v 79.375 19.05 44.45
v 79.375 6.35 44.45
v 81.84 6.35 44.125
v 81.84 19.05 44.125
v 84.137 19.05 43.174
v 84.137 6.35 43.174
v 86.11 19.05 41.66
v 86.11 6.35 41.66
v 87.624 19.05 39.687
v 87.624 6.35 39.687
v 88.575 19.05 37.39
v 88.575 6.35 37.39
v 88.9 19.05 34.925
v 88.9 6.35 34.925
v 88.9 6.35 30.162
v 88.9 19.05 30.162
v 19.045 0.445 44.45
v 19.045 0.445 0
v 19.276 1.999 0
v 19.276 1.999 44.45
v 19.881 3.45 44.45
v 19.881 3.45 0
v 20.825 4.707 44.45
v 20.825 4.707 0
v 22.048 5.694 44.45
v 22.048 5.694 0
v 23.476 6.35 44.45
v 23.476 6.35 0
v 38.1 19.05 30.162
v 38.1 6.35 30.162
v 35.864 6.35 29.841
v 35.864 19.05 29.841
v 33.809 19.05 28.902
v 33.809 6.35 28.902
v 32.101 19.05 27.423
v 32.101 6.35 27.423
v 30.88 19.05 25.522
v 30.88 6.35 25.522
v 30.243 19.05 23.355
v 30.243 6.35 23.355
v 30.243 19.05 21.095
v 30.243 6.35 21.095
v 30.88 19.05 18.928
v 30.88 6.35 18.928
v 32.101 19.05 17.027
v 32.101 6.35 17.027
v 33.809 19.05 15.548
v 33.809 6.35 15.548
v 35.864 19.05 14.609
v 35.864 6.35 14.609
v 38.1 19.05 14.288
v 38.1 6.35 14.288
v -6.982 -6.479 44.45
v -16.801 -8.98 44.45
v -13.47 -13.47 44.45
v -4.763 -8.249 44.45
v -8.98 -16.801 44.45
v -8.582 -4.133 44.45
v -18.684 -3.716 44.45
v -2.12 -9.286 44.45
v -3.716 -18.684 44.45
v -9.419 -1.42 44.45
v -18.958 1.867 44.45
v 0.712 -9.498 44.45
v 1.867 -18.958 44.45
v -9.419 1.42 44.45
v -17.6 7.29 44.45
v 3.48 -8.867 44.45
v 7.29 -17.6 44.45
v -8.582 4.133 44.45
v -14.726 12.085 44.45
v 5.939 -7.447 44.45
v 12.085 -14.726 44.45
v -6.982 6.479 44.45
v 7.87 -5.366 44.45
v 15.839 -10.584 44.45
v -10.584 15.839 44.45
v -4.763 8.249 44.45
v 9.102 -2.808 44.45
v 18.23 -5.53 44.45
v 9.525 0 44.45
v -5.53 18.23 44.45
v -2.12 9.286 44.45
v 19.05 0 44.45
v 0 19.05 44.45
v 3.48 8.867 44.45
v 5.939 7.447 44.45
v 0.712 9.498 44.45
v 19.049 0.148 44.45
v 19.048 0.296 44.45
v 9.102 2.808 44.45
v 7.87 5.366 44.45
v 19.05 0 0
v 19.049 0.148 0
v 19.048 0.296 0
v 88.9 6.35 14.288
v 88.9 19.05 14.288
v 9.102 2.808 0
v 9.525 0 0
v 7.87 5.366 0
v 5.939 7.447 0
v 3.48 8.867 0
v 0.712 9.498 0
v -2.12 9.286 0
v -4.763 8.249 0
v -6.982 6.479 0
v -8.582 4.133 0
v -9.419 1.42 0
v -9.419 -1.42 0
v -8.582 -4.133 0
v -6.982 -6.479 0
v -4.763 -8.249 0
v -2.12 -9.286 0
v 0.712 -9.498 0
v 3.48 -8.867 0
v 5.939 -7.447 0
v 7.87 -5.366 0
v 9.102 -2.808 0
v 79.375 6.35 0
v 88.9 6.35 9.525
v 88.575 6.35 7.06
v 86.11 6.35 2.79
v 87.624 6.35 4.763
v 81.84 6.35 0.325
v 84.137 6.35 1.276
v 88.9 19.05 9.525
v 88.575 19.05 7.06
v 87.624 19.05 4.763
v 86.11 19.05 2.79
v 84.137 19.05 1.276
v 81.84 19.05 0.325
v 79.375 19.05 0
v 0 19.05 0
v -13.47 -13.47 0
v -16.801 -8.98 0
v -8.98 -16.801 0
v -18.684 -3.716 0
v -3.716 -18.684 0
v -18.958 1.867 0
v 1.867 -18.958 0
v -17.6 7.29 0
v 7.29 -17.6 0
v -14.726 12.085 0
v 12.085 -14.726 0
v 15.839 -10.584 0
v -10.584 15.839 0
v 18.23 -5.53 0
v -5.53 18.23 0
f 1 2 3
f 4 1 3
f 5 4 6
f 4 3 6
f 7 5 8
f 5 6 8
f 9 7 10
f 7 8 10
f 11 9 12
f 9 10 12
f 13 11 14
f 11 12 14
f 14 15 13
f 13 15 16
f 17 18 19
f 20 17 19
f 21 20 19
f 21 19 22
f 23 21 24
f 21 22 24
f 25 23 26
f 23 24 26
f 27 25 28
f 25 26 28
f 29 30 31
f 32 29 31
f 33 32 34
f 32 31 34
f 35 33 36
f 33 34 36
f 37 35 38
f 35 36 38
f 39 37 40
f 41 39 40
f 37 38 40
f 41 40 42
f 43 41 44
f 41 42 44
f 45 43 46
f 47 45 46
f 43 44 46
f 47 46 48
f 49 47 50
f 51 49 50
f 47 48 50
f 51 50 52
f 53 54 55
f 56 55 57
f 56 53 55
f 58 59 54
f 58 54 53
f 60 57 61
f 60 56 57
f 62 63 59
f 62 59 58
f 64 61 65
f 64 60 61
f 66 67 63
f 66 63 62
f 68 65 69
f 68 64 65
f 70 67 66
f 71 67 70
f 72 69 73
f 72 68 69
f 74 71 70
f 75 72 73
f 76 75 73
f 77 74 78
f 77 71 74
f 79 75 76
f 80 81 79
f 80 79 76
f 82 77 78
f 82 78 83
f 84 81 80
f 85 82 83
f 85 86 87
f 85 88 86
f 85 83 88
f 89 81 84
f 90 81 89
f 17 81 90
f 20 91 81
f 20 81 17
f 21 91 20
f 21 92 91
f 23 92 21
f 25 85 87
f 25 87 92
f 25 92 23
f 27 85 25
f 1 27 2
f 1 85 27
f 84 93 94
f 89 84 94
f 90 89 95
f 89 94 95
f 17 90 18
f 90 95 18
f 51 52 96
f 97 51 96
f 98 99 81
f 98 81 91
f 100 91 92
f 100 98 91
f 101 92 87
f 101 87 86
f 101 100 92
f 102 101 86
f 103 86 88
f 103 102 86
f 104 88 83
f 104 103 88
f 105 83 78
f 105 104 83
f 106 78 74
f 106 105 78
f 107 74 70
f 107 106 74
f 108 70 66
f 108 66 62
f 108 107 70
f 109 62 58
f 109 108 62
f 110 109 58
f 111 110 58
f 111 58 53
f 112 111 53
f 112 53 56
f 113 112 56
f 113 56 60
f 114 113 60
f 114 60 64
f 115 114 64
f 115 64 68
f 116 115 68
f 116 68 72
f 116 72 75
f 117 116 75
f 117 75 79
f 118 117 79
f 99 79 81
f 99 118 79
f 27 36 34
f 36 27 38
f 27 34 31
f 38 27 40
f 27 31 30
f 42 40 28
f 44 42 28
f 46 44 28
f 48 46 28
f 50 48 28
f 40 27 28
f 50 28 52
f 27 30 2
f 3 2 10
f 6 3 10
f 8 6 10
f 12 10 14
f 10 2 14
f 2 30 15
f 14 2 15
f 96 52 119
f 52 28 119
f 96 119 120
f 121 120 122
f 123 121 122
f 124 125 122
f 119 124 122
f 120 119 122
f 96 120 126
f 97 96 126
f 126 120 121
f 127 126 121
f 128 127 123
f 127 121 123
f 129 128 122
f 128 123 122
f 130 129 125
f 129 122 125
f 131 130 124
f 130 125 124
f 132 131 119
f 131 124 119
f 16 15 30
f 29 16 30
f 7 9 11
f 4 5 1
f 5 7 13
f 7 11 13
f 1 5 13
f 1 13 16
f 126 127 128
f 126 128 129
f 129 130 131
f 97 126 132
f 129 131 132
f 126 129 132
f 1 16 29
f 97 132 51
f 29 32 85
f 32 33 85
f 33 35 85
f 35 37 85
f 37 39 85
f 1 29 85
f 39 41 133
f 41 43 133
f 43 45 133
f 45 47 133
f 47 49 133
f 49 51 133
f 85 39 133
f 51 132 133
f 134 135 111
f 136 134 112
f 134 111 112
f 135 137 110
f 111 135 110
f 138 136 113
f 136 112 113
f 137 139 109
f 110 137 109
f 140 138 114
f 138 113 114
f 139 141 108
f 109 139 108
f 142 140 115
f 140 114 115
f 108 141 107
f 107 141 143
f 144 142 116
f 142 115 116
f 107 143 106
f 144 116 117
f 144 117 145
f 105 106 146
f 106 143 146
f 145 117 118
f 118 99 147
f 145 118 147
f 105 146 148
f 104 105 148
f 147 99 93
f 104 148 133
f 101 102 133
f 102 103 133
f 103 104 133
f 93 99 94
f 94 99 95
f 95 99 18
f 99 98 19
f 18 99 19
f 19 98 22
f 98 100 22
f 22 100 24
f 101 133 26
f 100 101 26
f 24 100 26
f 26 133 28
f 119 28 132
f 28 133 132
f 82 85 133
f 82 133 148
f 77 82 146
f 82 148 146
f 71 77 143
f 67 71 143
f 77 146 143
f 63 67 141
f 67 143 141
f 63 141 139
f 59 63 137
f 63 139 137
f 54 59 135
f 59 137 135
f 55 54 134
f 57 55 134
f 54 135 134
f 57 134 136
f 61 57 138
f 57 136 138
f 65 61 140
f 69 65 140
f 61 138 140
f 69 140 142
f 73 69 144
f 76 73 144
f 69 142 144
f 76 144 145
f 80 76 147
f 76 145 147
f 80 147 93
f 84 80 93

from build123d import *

# Parameters (mm, degrees)
F0_R     = 9.525
F1_DEPTH = 44.45
F3_DEPTH = 25.4


with BuildPart() as f1:
    # F0 (on Top) → F1 (new body)
    with BuildSketch(Plane.XY):
        with BuildLine():
            Line((88.9, 19.05), (0, 19.05))
            ThreePointArc((0, 19.05), (-13.470384, -13.470384), (19.05, 0))
            ThreePointArc((19.05, 0), (19.043512, 0.222277), (19.04481, 0.444644))
            ThreePointArc((19.04481, 0.444644), (20.313858, 4.107427), (23.475712, 6.35))
            ThreePointArc((23.475712, 6.35), (25.393079, 6.646389), (27.310446, 6.35))
            Line((27.310446, 6.35), (88.9, 6.35))
            Line((88.9, 6.35), (88.9, 19.05))
        make_face()
        Circle(F0_R, mode=Mode.SUBTRACT)
        with BuildLine():
            ThreePointArc((19.04481, 0.444644), (19.043512, 0.222277), (19.05, 0))
            ThreePointArc((19.05, 0), (19.048702, 0.222337), (19.04481, 0.444644))
        make_face()
        with BuildLine():
            ThreePointArc((27.310446, 6.35), (25.393079, 6.646389), (23.475712, 6.35))
            Line((23.475712, 6.35), (27.310446, 6.35))
        make_face()
    extrude(amount=F1_DEPTH)

    # F2 (on face) → F3 (cut)
    with BuildSketch(Plane.XZ.offset(-6.35)):
        with BuildLine():
            Line((88.9, 14.2875), (88.9, 30.1625))
            Line((88.9, 30.1625), (38.1, 30.1625))
            ThreePointArc((38.1, 30.1625), (30.1625, 22.225), (38.1, 14.2875))
            Line((38.1, 14.2875), (88.9, 14.2875))
        make_face()
        with BuildLine():
            Line((88.9, 34.925), (88.9, 44.45))
            Line((88.9, 44.45), (79.375, 44.45))
            ThreePointArc((79.375, 44.45), (86.110192, 41.660192), (88.9, 34.925))
        make_face()
        with BuildLine():
            Line((88.9, 0), (88.9, 9.525))
            ThreePointArc((88.9, 9.525), (86.110192, 2.789808), (79.375, 0))
            Line((79.375, 0), (88.9, 0))
        make_face()
    extrude(amount=-F3_DEPTH, mode=Mode.SUBTRACT)


solid = f1.part
